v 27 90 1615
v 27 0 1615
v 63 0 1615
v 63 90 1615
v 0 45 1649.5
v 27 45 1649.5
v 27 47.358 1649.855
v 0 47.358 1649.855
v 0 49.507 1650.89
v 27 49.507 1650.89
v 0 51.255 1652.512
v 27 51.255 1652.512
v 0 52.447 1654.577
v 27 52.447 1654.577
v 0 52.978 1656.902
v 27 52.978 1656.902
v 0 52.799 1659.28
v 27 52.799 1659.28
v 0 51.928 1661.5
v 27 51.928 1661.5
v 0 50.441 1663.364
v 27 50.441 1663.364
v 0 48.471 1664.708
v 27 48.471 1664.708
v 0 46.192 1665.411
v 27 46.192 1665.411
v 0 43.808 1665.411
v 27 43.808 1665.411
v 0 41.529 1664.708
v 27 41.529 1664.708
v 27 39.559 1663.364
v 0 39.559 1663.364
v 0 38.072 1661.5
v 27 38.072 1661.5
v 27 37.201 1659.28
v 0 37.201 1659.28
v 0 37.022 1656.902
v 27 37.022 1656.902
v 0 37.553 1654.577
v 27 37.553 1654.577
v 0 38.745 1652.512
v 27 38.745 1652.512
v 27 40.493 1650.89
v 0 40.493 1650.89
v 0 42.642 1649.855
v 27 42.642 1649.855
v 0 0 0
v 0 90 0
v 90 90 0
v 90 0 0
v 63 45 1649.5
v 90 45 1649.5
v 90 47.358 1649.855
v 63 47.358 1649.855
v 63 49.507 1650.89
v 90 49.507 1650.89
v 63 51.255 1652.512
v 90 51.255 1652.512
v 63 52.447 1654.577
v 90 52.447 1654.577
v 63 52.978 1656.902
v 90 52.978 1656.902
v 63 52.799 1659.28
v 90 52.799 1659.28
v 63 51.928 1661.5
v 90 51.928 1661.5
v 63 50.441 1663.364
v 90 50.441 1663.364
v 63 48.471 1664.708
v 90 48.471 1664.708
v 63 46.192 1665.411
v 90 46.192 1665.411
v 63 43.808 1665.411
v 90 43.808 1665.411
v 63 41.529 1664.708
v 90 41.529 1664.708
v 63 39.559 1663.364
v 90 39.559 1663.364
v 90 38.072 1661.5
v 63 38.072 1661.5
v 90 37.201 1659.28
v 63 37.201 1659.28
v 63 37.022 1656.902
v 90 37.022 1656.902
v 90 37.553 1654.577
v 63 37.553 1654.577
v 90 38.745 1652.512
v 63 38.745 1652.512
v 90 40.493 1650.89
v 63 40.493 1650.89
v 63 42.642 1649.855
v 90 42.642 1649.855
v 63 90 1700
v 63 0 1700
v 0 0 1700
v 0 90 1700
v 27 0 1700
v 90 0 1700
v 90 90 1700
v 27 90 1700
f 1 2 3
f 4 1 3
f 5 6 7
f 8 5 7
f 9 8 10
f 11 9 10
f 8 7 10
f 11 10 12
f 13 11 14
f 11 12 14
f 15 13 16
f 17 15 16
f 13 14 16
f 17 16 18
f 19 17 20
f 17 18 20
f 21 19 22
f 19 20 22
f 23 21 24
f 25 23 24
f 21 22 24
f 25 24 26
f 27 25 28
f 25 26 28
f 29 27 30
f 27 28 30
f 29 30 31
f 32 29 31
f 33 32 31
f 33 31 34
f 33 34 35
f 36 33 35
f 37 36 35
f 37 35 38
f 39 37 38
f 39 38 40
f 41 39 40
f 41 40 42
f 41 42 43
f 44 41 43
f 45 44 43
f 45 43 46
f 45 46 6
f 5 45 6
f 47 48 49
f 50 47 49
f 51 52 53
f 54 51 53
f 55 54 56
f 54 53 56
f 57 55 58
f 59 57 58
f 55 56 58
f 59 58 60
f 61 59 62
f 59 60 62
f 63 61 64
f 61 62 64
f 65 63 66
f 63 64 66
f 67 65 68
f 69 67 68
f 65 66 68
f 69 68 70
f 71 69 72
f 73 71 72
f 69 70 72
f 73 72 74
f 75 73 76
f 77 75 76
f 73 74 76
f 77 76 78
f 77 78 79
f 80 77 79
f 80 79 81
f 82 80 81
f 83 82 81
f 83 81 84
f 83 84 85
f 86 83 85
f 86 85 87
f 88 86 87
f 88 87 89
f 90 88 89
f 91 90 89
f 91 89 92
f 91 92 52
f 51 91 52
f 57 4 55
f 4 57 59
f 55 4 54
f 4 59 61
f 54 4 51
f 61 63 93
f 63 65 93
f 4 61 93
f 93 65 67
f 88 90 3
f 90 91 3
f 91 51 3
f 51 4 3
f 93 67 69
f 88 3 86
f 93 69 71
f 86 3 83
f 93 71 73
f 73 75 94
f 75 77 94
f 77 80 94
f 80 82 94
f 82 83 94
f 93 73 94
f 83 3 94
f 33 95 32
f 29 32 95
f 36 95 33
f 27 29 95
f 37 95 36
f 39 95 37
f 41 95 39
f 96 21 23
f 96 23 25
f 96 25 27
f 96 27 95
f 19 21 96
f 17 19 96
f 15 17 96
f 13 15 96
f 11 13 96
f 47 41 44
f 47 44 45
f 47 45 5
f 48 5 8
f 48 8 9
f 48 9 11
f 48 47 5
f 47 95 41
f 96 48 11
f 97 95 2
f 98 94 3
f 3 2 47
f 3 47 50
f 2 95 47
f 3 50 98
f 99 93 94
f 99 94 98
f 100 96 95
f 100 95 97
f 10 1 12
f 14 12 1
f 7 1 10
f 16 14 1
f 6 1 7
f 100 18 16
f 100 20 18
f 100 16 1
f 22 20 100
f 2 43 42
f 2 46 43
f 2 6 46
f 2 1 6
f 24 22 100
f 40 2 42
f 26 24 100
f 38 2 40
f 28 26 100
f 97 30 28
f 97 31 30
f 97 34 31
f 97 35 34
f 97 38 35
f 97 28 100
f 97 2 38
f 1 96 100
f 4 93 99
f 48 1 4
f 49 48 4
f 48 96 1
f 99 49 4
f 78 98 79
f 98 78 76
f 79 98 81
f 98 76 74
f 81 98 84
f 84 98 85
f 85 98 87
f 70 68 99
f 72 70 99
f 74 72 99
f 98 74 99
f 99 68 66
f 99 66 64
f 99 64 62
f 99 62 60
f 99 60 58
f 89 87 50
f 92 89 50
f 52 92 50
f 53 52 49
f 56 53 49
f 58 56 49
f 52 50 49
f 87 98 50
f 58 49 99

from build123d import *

# Parameters (mm, degrees)
ESQUISSE1_W             = 90
ESQUISSE1_H             = 90
BOSS_EXTRU_1_DEPTH      = 1700
ESQUISSE2_W             = 36
ESQUISSE2_H             = 85
ENL_V_MAT_EXTRU_1_DEPTH = 1705.758047349
ESQUISSE3_R             = 8
ENL_V_MAT_EXTRU_2_DEPTH = 1705.758047349


with BuildPart() as part:
    # Esquisse1 → Boss.-Extru.1 (new body)
    with BuildSketch(Plane.XY):
        with Locations((45, 45)):
            Rectangle(ESQUISSE1_W, ESQUISSE1_H)
    extrude(amount=BOSS_EXTRU_1_DEPTH)

    # Esquisse2 → Enlèv. mat.-Extru.1 (cut, through all)
    with BuildSketch(Plane.XZ):
        with Locations((45, 1657.5)):
            Rectangle(ESQUISSE2_W, ESQUISSE2_H)
    extrude(amount=-ENL_V_MAT_EXTRU_1_DEPTH, mode=Mode.SUBTRACT)

    # Esquisse3 → Enlèv. mat.-Extru.2 (cut, through all)
    with BuildSketch(Plane(origin=(90, 0, 0), x_dir=(0, 0, -1), z_dir=(1, 0, 0))):
        with Locations((-1657.5, 45)):
            Circle(ESQUISSE3_R)
    extrude(amount=-ENL_V_MAT_EXTRU_2_DEPTH, mode=Mode.SUBTRACT)


solid = part.part
